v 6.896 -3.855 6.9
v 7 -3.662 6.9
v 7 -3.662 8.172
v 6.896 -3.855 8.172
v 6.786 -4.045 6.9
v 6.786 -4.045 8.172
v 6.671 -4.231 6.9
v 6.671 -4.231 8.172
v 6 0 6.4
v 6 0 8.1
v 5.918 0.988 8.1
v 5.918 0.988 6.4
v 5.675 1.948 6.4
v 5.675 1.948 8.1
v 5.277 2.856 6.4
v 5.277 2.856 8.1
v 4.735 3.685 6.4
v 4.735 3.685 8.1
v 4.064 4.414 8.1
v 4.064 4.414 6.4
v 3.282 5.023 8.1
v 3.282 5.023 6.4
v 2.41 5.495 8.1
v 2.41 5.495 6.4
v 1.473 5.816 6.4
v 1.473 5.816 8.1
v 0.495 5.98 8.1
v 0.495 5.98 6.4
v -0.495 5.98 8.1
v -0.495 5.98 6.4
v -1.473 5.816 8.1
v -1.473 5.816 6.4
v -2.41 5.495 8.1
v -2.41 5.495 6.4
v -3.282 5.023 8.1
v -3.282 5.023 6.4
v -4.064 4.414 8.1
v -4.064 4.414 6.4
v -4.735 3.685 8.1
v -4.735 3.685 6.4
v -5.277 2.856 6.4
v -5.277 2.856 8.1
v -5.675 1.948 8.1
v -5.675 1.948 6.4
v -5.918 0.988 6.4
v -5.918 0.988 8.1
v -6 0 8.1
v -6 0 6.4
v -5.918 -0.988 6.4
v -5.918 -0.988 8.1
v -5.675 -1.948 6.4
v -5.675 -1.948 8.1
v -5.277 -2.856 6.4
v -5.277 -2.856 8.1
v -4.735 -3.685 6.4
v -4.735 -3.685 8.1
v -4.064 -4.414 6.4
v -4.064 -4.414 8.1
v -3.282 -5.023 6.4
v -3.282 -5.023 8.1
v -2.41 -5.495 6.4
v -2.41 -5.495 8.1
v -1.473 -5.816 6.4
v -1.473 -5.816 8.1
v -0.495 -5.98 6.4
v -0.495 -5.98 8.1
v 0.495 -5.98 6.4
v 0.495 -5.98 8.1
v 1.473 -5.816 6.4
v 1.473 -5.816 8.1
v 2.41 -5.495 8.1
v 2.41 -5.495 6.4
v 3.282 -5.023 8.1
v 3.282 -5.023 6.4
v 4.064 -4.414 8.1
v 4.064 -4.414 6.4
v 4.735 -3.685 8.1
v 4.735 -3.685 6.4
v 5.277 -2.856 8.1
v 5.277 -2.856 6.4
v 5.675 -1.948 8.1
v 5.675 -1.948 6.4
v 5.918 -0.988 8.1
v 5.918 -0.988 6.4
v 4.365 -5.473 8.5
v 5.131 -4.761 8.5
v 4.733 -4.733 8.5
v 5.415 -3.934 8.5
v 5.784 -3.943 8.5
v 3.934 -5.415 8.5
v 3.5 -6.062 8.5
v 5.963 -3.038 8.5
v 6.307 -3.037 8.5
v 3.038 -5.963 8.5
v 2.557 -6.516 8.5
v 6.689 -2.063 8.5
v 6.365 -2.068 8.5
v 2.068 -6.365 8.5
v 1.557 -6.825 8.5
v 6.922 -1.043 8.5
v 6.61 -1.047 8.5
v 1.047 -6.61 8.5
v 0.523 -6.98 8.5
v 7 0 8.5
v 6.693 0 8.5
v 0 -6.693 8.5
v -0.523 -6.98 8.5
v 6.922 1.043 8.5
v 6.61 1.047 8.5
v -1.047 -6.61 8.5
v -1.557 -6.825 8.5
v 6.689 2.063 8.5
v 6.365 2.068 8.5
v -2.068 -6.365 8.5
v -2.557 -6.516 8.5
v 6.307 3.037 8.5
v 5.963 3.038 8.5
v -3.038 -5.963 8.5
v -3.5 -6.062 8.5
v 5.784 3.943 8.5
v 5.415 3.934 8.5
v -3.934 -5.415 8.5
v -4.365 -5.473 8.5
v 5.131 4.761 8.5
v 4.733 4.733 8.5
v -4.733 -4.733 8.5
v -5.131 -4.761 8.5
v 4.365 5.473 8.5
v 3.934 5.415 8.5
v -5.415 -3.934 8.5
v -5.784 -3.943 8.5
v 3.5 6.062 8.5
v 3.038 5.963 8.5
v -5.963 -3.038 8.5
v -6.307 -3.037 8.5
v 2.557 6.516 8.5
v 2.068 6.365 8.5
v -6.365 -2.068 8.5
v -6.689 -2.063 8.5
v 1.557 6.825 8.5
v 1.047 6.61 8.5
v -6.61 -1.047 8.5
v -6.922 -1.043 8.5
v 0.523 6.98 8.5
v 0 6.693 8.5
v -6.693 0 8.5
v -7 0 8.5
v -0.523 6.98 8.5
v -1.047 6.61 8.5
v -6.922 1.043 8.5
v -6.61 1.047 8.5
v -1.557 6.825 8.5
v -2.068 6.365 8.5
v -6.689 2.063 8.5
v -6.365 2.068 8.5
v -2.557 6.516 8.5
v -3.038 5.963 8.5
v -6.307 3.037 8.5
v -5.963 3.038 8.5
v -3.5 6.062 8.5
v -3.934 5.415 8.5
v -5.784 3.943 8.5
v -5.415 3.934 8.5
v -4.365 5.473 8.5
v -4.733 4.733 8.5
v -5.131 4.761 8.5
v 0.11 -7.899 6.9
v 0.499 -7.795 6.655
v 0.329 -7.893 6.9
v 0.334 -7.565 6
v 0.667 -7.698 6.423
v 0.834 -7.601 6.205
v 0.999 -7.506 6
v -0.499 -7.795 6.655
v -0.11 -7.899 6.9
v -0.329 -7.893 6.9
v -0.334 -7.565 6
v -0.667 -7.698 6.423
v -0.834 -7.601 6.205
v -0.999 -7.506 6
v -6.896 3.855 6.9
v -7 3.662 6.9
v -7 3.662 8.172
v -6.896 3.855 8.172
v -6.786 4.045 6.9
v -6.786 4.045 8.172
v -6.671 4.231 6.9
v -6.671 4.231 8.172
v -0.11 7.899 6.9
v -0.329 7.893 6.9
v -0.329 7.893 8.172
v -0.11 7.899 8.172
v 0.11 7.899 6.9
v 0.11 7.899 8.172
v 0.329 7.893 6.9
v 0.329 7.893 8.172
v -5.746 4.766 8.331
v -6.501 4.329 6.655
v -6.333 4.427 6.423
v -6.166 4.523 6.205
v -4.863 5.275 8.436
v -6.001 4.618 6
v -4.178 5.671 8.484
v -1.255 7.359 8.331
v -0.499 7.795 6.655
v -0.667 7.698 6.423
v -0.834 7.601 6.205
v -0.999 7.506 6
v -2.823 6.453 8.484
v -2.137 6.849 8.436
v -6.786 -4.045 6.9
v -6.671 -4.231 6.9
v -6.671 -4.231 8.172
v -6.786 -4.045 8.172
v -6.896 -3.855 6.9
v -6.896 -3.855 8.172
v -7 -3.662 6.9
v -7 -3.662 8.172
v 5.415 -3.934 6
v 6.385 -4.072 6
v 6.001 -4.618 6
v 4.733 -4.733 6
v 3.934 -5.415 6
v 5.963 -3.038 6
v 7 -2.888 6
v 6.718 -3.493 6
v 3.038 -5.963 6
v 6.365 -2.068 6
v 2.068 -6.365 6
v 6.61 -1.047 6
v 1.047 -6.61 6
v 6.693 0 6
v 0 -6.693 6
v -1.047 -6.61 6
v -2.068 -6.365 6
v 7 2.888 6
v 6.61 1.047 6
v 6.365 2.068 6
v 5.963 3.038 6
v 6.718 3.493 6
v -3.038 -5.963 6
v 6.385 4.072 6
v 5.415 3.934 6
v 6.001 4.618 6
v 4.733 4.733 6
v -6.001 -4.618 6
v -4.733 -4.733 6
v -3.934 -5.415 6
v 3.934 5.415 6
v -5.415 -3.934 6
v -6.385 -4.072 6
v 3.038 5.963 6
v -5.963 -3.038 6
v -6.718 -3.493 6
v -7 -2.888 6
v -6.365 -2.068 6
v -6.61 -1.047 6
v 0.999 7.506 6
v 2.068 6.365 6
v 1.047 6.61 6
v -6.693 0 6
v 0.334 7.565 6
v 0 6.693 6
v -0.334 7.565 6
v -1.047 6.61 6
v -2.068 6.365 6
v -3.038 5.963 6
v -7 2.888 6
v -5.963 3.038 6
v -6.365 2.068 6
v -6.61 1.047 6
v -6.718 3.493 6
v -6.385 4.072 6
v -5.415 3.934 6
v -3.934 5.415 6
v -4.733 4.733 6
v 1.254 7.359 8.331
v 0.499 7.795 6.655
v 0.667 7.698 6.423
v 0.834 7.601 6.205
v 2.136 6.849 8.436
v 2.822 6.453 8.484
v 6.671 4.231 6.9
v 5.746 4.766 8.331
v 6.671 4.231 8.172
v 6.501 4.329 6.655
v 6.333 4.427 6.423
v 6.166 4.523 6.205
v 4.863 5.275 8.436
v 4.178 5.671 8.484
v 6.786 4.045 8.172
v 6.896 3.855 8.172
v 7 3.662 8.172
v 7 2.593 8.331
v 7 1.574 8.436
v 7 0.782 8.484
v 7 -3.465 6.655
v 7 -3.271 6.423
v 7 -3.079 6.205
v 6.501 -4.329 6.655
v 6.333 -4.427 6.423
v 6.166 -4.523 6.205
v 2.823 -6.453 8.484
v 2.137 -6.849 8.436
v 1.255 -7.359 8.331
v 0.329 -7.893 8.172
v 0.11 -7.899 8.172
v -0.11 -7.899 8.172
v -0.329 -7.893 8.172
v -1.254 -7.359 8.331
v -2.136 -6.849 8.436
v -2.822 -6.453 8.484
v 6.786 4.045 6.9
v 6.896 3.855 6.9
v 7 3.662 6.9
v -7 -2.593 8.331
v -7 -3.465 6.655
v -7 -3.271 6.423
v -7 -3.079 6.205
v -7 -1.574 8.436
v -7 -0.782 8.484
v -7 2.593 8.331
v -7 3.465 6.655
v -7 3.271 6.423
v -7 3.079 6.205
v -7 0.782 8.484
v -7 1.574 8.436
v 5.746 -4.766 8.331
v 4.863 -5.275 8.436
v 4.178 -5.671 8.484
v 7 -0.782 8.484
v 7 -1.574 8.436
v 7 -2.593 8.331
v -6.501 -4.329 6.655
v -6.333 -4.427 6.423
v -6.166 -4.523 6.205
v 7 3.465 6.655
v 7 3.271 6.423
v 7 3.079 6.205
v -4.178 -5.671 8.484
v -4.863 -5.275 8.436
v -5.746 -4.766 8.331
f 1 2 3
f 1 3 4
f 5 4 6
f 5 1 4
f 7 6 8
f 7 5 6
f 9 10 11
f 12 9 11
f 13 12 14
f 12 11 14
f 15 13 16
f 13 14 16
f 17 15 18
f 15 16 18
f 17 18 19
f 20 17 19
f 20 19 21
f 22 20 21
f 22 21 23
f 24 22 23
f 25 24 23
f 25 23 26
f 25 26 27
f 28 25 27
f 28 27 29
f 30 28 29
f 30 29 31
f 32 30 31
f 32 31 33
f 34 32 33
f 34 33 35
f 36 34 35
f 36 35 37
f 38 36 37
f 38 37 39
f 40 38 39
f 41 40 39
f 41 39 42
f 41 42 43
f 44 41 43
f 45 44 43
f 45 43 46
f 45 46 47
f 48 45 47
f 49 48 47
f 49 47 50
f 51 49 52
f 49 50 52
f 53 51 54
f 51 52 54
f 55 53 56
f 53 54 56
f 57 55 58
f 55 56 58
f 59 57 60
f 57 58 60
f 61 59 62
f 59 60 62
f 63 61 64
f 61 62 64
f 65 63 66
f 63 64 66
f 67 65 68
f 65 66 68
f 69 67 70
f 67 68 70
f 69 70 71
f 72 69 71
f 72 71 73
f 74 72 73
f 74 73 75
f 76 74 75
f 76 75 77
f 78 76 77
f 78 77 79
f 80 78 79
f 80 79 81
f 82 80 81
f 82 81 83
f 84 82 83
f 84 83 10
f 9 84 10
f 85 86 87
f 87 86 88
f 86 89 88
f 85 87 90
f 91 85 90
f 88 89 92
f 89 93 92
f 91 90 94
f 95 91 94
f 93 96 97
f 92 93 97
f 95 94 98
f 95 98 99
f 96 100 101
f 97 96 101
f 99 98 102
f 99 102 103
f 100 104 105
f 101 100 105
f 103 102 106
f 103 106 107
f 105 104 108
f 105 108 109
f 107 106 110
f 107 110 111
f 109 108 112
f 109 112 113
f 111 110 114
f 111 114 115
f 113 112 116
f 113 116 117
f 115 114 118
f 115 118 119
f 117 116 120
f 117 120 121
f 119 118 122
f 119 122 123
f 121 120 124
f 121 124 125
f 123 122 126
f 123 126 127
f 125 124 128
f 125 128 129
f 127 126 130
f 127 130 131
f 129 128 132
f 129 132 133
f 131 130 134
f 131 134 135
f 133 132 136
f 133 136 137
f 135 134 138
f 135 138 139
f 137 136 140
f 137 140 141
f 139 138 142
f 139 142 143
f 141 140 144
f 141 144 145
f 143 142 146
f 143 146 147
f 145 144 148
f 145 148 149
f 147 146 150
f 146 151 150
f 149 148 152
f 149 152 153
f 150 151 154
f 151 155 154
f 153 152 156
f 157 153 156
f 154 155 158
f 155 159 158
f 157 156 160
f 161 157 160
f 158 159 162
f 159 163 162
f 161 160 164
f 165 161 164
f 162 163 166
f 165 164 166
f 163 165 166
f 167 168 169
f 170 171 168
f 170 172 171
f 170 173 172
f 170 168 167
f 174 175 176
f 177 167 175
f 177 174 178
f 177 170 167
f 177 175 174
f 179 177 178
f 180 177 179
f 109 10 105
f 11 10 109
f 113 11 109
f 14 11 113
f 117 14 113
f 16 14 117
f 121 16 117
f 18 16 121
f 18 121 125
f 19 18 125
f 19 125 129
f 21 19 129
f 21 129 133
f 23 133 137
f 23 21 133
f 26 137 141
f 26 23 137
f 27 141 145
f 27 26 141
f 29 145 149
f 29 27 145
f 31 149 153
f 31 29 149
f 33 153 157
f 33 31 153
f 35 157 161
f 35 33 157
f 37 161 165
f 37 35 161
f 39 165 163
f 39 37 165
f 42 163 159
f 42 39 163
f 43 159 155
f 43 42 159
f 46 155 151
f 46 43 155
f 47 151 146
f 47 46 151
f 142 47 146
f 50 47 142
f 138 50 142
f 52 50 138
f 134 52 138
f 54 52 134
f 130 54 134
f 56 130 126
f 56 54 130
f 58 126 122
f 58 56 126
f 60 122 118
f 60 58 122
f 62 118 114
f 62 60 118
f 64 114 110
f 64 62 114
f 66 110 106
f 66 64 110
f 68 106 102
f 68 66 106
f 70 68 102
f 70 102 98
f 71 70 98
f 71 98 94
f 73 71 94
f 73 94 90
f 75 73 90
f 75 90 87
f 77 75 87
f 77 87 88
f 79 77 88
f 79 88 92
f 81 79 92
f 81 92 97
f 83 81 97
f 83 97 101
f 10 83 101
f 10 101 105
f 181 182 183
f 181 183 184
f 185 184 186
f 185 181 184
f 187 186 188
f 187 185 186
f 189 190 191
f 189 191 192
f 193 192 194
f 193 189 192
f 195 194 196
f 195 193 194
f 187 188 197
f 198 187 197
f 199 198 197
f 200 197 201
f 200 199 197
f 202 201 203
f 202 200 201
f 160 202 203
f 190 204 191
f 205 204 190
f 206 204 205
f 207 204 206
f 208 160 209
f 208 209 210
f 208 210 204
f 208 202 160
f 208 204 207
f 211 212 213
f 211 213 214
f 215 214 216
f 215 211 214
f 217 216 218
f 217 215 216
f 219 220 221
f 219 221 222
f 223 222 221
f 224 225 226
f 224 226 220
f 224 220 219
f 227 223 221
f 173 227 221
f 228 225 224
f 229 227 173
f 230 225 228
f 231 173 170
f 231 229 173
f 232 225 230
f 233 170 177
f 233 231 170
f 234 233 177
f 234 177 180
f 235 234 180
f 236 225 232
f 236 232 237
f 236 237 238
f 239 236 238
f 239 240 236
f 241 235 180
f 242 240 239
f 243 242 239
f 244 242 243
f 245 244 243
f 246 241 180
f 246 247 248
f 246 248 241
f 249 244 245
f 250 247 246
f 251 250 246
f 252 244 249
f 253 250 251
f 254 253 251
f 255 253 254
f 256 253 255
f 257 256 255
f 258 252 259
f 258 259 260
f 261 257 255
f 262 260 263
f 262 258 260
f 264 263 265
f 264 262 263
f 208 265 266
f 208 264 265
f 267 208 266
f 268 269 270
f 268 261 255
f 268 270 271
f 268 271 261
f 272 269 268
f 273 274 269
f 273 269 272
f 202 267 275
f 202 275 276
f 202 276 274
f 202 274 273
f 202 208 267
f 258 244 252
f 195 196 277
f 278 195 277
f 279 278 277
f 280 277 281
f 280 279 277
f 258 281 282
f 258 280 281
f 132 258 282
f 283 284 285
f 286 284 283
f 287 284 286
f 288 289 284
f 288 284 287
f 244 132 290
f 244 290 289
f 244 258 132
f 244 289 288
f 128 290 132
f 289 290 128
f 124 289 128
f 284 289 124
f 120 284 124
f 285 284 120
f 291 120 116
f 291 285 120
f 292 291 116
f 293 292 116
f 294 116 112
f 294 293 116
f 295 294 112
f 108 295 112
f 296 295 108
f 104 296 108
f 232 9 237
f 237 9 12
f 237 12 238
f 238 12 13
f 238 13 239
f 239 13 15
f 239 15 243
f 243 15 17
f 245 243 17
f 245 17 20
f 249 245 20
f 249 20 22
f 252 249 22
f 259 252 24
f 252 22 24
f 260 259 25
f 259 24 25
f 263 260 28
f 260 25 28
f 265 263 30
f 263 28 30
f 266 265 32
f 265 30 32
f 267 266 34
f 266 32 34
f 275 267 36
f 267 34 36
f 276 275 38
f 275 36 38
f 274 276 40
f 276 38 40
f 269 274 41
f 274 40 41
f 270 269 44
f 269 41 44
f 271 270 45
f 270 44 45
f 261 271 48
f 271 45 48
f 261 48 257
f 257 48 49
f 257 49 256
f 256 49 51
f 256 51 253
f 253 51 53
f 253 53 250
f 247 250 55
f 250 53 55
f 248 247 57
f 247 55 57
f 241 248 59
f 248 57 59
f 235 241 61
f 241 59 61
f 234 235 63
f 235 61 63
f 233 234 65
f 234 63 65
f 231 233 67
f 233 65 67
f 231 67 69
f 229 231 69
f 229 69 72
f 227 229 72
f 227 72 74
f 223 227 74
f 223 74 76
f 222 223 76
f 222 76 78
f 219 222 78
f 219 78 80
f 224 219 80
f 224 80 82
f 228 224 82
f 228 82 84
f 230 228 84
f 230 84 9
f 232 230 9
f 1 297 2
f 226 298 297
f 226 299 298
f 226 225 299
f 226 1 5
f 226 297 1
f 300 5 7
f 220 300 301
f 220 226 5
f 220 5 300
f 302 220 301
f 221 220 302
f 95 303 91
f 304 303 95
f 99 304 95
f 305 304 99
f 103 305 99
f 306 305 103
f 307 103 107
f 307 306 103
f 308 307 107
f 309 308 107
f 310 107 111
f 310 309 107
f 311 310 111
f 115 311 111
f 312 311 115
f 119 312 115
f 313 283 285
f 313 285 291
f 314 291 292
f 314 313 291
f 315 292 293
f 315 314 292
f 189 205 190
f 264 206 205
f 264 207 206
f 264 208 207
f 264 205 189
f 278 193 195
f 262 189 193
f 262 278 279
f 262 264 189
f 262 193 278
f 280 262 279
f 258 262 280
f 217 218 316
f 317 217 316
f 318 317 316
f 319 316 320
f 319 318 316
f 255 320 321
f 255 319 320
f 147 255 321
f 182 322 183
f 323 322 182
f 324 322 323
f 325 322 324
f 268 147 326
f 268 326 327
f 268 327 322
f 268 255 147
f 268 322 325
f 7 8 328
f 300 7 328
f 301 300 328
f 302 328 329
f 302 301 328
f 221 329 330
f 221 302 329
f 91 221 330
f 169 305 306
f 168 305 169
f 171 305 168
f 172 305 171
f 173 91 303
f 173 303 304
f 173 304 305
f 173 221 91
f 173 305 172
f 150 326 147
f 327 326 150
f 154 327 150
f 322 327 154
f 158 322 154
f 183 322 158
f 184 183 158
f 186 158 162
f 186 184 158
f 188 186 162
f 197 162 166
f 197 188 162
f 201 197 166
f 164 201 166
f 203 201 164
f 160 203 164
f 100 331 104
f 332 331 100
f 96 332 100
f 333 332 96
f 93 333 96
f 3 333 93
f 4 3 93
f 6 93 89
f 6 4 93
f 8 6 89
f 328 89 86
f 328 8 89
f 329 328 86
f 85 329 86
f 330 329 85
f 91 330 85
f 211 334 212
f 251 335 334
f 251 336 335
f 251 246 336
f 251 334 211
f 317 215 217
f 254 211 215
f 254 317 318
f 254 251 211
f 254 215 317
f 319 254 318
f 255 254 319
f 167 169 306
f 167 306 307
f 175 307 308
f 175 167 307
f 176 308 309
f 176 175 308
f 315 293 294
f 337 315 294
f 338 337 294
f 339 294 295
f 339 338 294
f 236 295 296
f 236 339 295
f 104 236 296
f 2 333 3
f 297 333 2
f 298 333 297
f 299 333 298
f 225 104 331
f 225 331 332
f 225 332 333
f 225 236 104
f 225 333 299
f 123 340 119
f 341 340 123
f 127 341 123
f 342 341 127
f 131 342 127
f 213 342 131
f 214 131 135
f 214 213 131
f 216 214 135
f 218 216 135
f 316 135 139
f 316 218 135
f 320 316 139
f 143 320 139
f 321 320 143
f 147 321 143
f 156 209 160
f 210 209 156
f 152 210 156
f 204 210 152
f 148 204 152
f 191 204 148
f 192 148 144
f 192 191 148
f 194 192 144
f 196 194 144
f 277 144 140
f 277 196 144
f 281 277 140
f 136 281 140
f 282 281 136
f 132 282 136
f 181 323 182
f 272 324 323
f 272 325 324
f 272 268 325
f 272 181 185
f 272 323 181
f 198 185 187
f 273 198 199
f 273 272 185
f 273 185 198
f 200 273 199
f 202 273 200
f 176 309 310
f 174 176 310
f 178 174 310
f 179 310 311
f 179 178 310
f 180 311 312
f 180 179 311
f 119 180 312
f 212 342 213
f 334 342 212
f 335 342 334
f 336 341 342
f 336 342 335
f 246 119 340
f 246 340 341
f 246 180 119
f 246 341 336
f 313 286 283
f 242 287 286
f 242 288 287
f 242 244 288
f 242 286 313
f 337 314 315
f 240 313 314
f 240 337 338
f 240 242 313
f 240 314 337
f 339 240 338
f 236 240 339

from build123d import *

# Parameters (mm, degrees)
BOSS_EXTRUDE1_DEPTH   = 2.5
HOLE1_D               = 12
HOLE1_DEPTH           = 2.5
CHAMFER1_SIZE         = 0.9
CHAMFER1_SIZE2        = 0.327573212
CHAMFER1_PART_2_SIZE  = 0.9
CHAMFER1_PART_2_SIZE2 = 0.327573212
CHAMFER1_PART_3_SIZE  = 0.9
CHAMFER1_PART_3_SIZE2 = 0.327573212
CHAMFER1_PART_4_SIZE  = 0.9
CHAMFER1_PART_4_SIZE2 = 0.327573212
CHAMFER1_PART_5_SIZE  = 0.9
CHAMFER1_PART_5_SIZE2 = 0.327573212
CHAMFER1_PART_6_SIZE  = 0.9
CHAMFER1_PART_6_SIZE2 = 0.327573212
CHAMFER1_PART_7_SIZE  = 0.9
CHAMFER1_PART_7_SIZE2 = 0.327573212
CHAMFER2_SIZE         = 0.692820323
CHAMFER2_SIZE2        = 0.400000001
CHAMFER3_SIZE         = 0.692820323
CHAMFER3_SIZE2        = 0.400000001


with BuildPart() as part:
    # Sketch1 → Boss-Extrude1 (new body)
    with BuildSketch(Plane(origin=(0, 0, 6), x_dir=(-1, 0, 0), z_dir=(0, 0, -1))):
        with BuildLine():
            Line((-7, 3.661966685), (-7, -3.661966685))
            ThreePointArc((-7, -3.661966685), (-6.84160069, -3.95), (-6.671356177, -4.231194484))
            Line((-6.671356177, -4.231194484), (-0.328643823, -7.893161169))
            ThreePointArc((-0.328643823, -7.893161169), (0, -7.9), (0.328643823, -7.893161169))
            Line((0.328643823, -7.893161169), (6.671356177, -4.231194484))
            ThreePointArc((6.671356177, -4.231194484), (6.84160069, -3.95), (7, -3.661966685))
            Line((7, -3.661966685), (7, 3.661966685))
            ThreePointArc((7, 3.661966685), (6.84160069, 3.95), (6.671356177, 4.231194484))
            Line((6.671356177, 4.231194484), (0.328643823, 7.893161169))
            ThreePointArc((0.328643823, 7.893161169), (0, 7.9), (-0.328643823, 7.893161169))
            Line((-0.328643823, 7.893161169), (-6.671356177, 4.231194484))
            ThreePointArc((-6.671356177, 4.231194484), (-6.84160069, 3.95), (-7, 3.661966685))
        make_face()
    extrude(amount=-BOSS_EXTRUDE1_DEPTH)

    # Hole1
    with Locations(Plane(origin=(0, 0, 6), x_dir=(-1, 0, 0), z_dir=(0, 0, -1))):
        with Locations((0, 0)):
            Hole(HOLE1_D / 2, depth=HOLE1_DEPTH)

    # Chamfer1
    chamfer1_edges = [part.edges().sort_by_distance(p)[0] for p in [
        (0, -7.9, 8.5),
        (-6.84160069, 3.95, 8.5),
        (6.84160069, 3.95, 8.5),
        (6.84160069, -3.95, 8.5),
        (0, 7.9, 8.5),
        (-6.84160069, -3.95, 8.5),
    ]]
    chamfer1_side = [part.faces().sort_by_distance(p)[0] for p in [
        (3.394449064, 5.879358243, 8.5),
    ]]
    chamfer(chamfer1_edges, length=CHAMFER1_SIZE, length2=CHAMFER1_SIZE2, reference=chamfer1_side[0])

    # Chamfer1 part 2
    chamfer1_part_2_edges = [part.edges().sort_by_distance(p)[0] for p in [
        (6.84160069, 3.95, 6),
    ]]
    chamfer1_part_2_side = [part.faces().sort_by_distance(p)[0] for p in [
        (6.84160069, 3.95, 7.25),
    ]]
    chamfer(chamfer1_part_2_edges, length=CHAMFER1_PART_2_SIZE, length2=CHAMFER1_PART_2_SIZE2, reference=chamfer1_part_2_side[0])

    # Chamfer1 part 3
    chamfer1_part_3_edges = [part.edges().sort_by_distance(p)[0] for p in [
        (0, 7.9, 6),
    ]]
    chamfer1_part_3_side = [part.faces().sort_by_distance(p)[0] for p in [
        (0, 7.9, 7.25),
    ]]
    chamfer(chamfer1_part_3_edges, length=CHAMFER1_PART_3_SIZE, length2=CHAMFER1_PART_3_SIZE2, reference=chamfer1_part_3_side[0])

    # Chamfer1 part 4
    chamfer1_part_4_edges = [part.edges().sort_by_distance(p)[0] for p in [
        (-6.84160069, 3.95, 6),
    ]]
    chamfer1_part_4_side = [part.faces().sort_by_distance(p)[0] for p in [
        (-6.84160069, 3.95, 7.25),
    ]]
    chamfer(chamfer1_part_4_edges, length=CHAMFER1_PART_4_SIZE, length2=CHAMFER1_PART_4_SIZE2, reference=chamfer1_part_4_side[0])

    # Chamfer1 part 5
    chamfer1_part_5_edges = [part.edges().sort_by_distance(p)[0] for p in [
        (-6.84160069, -3.95, 6),
    ]]
    chamfer1_part_5_side = [part.faces().sort_by_distance(p)[0] for p in [
        (-6.84160069, -3.95, 7.25),
    ]]
    chamfer(chamfer1_part_5_edges, length=CHAMFER1_PART_5_SIZE, length2=CHAMFER1_PART_5_SIZE2, reference=chamfer1_part_5_side[0])

    # Chamfer1 part 6
    chamfer1_part_6_edges = [part.edges().sort_by_distance(p)[0] for p in [
        (0, -7.9, 6),
    ]]
    chamfer1_part_6_side = [part.faces().sort_by_distance(p)[0] for p in [
        (0, -7.9, 7.25),
    ]]
    chamfer(chamfer1_part_6_edges, length=CHAMFER1_PART_6_SIZE, length2=CHAMFER1_PART_6_SIZE2, reference=chamfer1_part_6_side[0])

    # Chamfer1 part 7
    chamfer1_part_7_edges = [part.edges().sort_by_distance(p)[0] for p in [
        (6.84160069, -3.95, 6),
    ]]
    chamfer1_part_7_side = [part.faces().sort_by_distance(p)[0] for p in [
        (6.84160069, -3.95, 7.25),
    ]]
    chamfer(chamfer1_part_7_edges, length=CHAMFER1_PART_7_SIZE, length2=CHAMFER1_PART_7_SIZE2, reference=chamfer1_part_7_side[0])

    # Chamfer2
    chamfer2_edges = [part.edges().sort_by_distance(p)[0] for p in [
        (-6, 0, 6),
    ]]
    chamfer2_side = [part.faces().sort_by_distance(p)[0] for p in [
        (3.396877913, -5.883565133, 6),
    ]]
    chamfer(chamfer2_edges, length=CHAMFER2_SIZE, length2=CHAMFER2_SIZE2, reference=chamfer2_side[0])

    # Chamfer3
    chamfer3_edges = [part.edges().sort_by_distance(p)[0] for p in [
        (-6, 0, 8.5),
    ]]
    chamfer3_side = [part.faces().sort_by_distance(p)[0] for p in [
        (3.401005054, 5.890713542, 8.5),
    ]]
    chamfer(chamfer3_edges, length=CHAMFER3_SIZE, length2=CHAMFER3_SIZE2, reference=chamfer3_side[0])


solid = part.part
